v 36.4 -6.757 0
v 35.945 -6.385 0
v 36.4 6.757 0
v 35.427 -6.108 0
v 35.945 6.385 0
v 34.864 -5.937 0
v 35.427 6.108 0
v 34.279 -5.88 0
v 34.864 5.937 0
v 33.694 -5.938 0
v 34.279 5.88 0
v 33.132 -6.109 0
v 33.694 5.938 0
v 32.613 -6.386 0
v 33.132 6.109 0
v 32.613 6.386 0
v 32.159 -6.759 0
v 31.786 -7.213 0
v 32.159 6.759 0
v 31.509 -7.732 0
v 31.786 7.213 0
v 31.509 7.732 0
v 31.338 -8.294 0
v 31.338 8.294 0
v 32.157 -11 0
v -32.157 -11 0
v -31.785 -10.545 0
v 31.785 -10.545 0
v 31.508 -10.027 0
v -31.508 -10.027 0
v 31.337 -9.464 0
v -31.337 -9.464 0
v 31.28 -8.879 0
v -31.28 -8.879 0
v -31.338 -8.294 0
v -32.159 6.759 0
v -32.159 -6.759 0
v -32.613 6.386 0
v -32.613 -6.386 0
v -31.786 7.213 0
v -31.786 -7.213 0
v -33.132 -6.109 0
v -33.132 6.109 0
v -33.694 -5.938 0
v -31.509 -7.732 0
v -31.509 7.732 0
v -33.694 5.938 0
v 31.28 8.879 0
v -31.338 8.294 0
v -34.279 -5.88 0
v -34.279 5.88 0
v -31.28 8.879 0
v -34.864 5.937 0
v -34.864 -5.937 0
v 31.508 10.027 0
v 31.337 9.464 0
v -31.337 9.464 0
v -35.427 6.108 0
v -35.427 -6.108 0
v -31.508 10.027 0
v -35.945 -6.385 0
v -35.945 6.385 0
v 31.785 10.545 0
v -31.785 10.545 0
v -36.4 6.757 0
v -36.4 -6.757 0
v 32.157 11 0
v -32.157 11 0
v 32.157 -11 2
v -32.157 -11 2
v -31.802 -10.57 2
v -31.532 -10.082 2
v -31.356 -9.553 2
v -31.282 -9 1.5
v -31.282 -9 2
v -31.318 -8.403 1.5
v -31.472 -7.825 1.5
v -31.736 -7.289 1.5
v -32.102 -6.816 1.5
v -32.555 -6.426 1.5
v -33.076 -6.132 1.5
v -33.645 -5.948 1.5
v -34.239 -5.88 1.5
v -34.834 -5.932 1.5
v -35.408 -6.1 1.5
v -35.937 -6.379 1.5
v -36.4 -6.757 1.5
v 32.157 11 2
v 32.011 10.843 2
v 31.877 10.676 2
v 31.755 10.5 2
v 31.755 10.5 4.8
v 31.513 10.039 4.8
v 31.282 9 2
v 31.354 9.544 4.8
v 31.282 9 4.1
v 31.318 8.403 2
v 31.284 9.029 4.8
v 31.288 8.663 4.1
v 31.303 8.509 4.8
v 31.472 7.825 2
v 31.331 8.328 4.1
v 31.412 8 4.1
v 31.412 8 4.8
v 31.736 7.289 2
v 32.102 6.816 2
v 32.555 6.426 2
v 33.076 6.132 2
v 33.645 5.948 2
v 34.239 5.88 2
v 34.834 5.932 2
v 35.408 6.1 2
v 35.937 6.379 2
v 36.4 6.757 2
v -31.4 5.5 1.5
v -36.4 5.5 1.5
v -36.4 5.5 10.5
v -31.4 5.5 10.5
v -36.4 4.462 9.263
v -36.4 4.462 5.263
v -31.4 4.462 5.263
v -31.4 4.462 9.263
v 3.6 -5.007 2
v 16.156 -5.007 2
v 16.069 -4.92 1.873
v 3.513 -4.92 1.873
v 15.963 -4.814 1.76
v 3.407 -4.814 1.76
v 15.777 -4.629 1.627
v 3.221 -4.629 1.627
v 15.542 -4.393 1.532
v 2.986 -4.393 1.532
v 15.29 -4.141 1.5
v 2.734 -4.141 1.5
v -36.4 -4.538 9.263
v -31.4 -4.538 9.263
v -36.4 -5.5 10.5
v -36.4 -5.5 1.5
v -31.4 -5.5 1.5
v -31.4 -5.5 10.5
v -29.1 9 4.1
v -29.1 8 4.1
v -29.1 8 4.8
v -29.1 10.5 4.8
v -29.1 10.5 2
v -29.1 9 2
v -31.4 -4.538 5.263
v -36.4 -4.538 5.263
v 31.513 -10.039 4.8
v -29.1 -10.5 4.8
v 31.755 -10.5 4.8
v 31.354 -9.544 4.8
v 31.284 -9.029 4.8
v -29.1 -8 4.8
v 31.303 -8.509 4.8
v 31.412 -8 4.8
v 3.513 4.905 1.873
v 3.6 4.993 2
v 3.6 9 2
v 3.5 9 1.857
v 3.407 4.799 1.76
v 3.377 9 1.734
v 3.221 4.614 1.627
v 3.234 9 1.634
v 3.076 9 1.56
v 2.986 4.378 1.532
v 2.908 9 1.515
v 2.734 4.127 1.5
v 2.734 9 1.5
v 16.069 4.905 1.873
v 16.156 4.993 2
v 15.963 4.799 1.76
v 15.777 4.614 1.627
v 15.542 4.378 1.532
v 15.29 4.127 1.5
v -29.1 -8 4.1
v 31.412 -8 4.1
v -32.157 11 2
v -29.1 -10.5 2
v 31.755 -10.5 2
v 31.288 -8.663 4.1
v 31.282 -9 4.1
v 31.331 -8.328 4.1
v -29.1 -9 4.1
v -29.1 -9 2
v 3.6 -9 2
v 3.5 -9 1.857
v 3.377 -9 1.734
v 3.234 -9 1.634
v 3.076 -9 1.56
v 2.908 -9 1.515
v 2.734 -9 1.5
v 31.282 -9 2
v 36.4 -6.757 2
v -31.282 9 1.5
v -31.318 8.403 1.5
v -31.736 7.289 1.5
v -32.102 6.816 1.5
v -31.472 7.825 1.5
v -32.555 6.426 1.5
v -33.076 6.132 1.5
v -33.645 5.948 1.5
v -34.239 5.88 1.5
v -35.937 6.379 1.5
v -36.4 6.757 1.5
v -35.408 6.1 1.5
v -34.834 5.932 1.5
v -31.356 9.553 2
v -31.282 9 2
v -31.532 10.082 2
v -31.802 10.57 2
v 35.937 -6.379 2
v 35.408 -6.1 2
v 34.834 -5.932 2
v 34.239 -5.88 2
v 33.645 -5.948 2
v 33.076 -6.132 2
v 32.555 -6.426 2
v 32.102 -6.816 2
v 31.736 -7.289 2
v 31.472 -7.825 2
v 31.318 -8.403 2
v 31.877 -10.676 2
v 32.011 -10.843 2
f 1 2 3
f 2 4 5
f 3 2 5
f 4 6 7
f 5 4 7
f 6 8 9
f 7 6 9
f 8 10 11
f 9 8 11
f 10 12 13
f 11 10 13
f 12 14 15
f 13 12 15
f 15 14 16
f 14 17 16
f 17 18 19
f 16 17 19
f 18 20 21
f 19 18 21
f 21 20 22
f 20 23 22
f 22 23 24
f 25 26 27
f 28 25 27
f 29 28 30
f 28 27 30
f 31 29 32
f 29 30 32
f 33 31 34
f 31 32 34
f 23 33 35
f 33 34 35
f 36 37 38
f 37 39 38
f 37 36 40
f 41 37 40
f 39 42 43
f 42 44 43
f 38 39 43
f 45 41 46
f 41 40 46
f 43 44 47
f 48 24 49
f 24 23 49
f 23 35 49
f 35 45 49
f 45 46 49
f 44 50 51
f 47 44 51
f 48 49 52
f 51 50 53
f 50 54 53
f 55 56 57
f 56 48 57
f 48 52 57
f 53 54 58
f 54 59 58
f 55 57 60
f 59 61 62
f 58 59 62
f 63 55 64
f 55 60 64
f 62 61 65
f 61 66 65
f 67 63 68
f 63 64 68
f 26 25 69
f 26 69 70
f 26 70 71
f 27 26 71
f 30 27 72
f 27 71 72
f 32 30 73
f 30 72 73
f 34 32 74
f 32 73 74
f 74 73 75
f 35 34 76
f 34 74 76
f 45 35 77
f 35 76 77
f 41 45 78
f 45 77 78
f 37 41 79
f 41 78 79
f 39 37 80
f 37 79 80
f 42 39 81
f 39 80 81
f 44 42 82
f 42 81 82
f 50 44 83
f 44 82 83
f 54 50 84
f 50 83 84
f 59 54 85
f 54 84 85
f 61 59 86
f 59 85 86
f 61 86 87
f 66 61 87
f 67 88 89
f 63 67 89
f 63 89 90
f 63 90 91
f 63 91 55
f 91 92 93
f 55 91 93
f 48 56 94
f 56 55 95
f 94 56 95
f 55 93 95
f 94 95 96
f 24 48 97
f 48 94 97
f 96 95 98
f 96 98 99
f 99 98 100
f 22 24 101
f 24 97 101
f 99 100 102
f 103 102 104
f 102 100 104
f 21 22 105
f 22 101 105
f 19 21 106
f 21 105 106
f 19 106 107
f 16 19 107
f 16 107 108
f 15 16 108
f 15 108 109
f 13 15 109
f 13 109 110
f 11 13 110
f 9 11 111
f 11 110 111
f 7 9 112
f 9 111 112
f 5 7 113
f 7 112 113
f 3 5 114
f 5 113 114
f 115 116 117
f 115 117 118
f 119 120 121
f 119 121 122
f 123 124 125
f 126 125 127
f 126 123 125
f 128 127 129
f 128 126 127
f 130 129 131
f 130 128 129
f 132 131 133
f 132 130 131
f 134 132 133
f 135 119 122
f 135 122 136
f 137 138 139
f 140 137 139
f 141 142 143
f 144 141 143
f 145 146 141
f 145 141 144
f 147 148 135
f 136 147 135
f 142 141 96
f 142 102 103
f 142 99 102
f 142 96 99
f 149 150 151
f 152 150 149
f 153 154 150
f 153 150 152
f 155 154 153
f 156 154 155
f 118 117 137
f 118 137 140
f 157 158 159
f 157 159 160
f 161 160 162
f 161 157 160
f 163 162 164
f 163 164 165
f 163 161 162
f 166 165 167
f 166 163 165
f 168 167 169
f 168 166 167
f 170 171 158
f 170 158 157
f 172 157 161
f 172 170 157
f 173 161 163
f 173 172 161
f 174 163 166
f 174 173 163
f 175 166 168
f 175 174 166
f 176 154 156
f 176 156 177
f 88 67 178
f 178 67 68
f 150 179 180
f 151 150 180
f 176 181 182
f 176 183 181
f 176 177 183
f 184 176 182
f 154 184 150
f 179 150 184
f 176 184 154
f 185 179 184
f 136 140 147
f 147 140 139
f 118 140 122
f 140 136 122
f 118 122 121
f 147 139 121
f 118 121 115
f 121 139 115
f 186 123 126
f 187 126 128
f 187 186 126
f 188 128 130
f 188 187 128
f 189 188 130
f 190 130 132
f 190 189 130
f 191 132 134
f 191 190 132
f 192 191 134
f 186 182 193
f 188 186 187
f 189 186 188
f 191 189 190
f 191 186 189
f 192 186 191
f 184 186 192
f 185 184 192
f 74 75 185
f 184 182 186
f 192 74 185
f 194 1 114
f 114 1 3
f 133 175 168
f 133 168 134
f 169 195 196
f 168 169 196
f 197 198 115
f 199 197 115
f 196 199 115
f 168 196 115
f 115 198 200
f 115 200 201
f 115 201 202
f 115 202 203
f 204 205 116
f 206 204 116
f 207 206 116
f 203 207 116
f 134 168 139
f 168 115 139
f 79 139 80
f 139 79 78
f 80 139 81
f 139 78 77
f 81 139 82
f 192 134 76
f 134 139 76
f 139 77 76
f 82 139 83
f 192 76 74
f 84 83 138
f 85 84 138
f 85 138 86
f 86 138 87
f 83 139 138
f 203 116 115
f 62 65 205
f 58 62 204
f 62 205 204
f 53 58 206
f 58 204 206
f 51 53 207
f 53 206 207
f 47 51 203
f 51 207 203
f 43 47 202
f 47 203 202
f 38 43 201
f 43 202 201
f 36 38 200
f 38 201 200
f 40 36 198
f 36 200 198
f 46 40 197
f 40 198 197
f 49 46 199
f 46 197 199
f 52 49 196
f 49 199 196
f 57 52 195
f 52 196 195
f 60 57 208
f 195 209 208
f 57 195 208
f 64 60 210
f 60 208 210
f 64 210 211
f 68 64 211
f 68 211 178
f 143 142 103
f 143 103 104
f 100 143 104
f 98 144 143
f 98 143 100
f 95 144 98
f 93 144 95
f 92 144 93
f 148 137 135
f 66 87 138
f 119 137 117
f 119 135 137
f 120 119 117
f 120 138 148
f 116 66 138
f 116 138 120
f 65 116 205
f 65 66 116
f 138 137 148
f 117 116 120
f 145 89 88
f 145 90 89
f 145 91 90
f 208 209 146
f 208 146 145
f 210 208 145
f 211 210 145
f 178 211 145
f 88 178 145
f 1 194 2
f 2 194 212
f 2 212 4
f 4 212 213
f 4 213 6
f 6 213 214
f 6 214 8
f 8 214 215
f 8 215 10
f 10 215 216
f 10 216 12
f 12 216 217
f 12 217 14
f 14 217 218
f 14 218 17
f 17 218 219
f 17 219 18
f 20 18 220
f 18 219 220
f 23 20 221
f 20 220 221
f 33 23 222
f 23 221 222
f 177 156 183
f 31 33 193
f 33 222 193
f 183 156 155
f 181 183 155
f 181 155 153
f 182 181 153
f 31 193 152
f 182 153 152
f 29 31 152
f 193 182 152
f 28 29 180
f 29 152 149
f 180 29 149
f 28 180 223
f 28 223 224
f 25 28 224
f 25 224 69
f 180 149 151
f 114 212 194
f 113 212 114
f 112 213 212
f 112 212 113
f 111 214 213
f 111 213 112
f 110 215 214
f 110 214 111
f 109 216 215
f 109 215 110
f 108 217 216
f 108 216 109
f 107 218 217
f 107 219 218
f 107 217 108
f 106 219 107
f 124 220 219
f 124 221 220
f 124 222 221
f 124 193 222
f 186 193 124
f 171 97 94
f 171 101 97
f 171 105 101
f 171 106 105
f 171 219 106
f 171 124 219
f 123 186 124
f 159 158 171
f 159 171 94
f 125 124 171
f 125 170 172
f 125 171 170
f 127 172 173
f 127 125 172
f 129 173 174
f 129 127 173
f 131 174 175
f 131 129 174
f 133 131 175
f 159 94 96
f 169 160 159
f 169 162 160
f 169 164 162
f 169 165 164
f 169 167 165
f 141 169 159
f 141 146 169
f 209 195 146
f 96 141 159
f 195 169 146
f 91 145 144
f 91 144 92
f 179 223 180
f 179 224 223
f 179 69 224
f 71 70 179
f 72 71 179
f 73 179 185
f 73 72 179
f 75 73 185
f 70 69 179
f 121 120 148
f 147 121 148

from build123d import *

# Parameters (mm, degrees)
SKIZZE1_W                       = 22
SKIZZE1_H                       = 72.8
AUFSATZ_LINEAR_AUSTRAGEN1_DEPTH = 2
SKIZZE2_R                       = 3
SCHNITT_LINEAR_AUSTRAGEN1_DEPTH = 2
SKIZZE3_W                       = 65.5
SKIZZE3_H                       = 21
AUFSATZ_LINEAR_AUSTRAGEN2_DEPTH = 2.8
SCHNITT_LINEAR_AUSTRAGEN2_DEPTH = 67.590464783
SKIZZE5_R                       = 3
SCHNITT_LINEAR_AUSTRAGEN4_DEPTH = 39.128729326
SKIZZE6_W                       = 18
SKIZZE6_H                       = 1
SCHNITT_LINEAR_AUSTRAGEN5_DEPTH = 40
SKIZZE8_W                       = 15
SKIZZE8_H                       = 10
SCHNITT_LINEAR_AUSTRAGEN6_DEPTH = 0.5
VERRUNDUNG3_R                   = 1
SKIZZE9_W                       = 5
SKIZZE9_H                       = 11
AUFSATZ_LINEAR_AUSTRAGEN3_DEPTH = 9
SKIZZE10_W                      = 9
SKIZZE10_H                      = 4
SCHNITT_LINEAR_AUSTRAGEN7_DEPTH = 75.371298227


with BuildPart() as part:
    # Skizze1 → Aufsatz-Linear austragen1 (new body)
    with BuildSketch(Plane(origin=(0, 0, 0), x_dir=(0, 1, 0), z_dir=(0, 0, 1))):
        Rectangle(SKIZZE1_W, SKIZZE1_H)
    extrude(amount=AUFSATZ_LINEAR_AUSTRAGEN1_DEPTH)

    # Skizze2 → Schnitt-Linear austragen1 (cut)
    with BuildSketch(Plane.XY.offset(2)):
        with Locations((-34.28, 8.88)):
            Circle(SKIZZE2_R)
        with Locations((-34.28, -8.88)):
            Circle(SKIZZE2_R)
        with Locations((34.28, -8.88)):
            Circle(SKIZZE2_R)
        with Locations((34.28, 8.88)):
            Circle(SKIZZE2_R)
    extrude(amount=-SCHNITT_LINEAR_AUSTRAGEN1_DEPTH, mode=Mode.SUBTRACT)

    # Skizze3 → Aufsatz-Linear austragen2 (add)
    with BuildSketch(Plane.XY.offset(2)):
        with Locations((3.65, 0)):
            Rectangle(SKIZZE3_W, SKIZZE3_H)
    extrude(amount=AUFSATZ_LINEAR_AUSTRAGEN2_DEPTH)

    # Skizze4 → Schnitt-Linear austragen2 (cut, through all)
    with BuildSketch(Plane(origin=(-29.1, 0, 0), x_dir=(0, -1, 0), z_dir=(-1, 0, 0))):
        Polygon((-8, 4.8), (8, 4.8), (8, 4.1), (9, 4.1), (9, 2), (-9, 2), (-9, 4.1), (-8, 4.1), align=None)
    extrude(amount=-SCHNITT_LINEAR_AUSTRAGEN2_DEPTH, mode=Mode.SUBTRACT)

    # Skizze5 → Schnitt-Linear austragen4 (cut, through all)
    with BuildSketch(Plane(origin=(0, 0, 2), x_dir=(1, 0, 0), z_dir=(0, 0, -1))):
        with Locations((34.28, -8.88)):
            Circle(SKIZZE5_R)
        with Locations((34.28, 8.88)):
            Circle(SKIZZE5_R)
    extrude(amount=-SCHNITT_LINEAR_AUSTRAGEN4_DEPTH, mode=Mode.SUBTRACT)

    # Skizze6 → Schnitt-Linear austragen5 (cut)
    with BuildSketch(Plane(origin=(-36.4, 0, 0), x_dir=(0, -1, 0), z_dir=(-1, 0, 0))):
        with Locations((0, 2)):
            Rectangle(SKIZZE6_W, SKIZZE6_H)
    extrude(amount=-SCHNITT_LINEAR_AUSTRAGEN5_DEPTH, mode=Mode.SUBTRACT)

    # Skizze8 → Schnitt-Linear austragen6 (cut)
    with BuildSketch(Plane.XY.offset(2)):
        with Locations((8.655984658, -0.007335612)):
            Rectangle(SKIZZE8_W, SKIZZE8_H)
    extrude(amount=-SCHNITT_LINEAR_AUSTRAGEN6_DEPTH, mode=Mode.SUBTRACT)

    # Verrundung3
    # the kernel refuses this fillet: 1 mm, written as the material it adds along each edge
    with BuildSketch(Plane(origin=(3.6, -9, 1.5), x_dir=(0, 0, 1), z_dir=(0, 1, 0))) as verrundung3_piece_1:
        with BuildLine():
            CenterArc((1, -0.866025404), VERRUNDUNG3_R, 120, 60)
            Line((0, -0.866025404), (-0.02, -0.866025404))
            Line((-0.02, -0.866025404), (-0.02, 0))
            Line((-0.02, 0), (0, 0.02))
            ThreePointArc((0, 0.02), (0.25, 0.02), (0.49, 0.017320508))
            Line((0.49, 0.017320508), (0.5, 0))
        make_face()
    extrude(amount=3.992664388)
    with BuildSketch(Plane(origin=(3.6, -5.007335612, 1.5), x_dir=(0, 0, 1), z_dir=(1, 0, 0)), Plane(origin=(16.155984658, 4.992664388, 1.5), x_dir=(0, 0, 1), z_dir=(-1, 0, 0))) as verrundung3_piece_2:
        with BuildLine():
            CenterArc((1, -0.866025404), VERRUNDUNG3_R, 120, 60)
            Line((0, -0.866025404), (-0.02, -0.866025404))
            Line((-0.02, -0.866025404), (-0.02, 0))
            Line((-0.02, 0), (0, 0.02))
            ThreePointArc((0, 0.02), (0.25, 0.02), (0.49, 0.017320508))
            Line((0.49, 0.017320508), (0.5, 0))
        make_face()
    extrude(amount=12.555984658)
    with BuildSketch(Plane(origin=(3.6, 4.992664388, 1.5), x_dir=(0, 0, 1), z_dir=(0, 1, 0))) as verrundung3_piece_3:
        with BuildLine():
            CenterArc((1, -0.866025404), VERRUNDUNG3_R, 120, 60)
            Line((0, -0.866025404), (-0.02, -0.866025404))
            Line((-0.02, -0.866025404), (-0.02, 0))
            Line((-0.02, 0), (0, 0.02))
            ThreePointArc((0, 0.02), (0.25, 0.02), (0.49, 0.017320508))
            Line((0.49, 0.017320508), (0.5, 0))
        make_face()
    extrude(amount=4.007335612)
    with BuildSketch(Plane(origin=(16.155984658, -5.007335612, 1.5), x_dir=(0, 0, 1), z_dir=(0, 1, 0))) as verrundung3_piece_4:
        with BuildLine():
            CenterArc((1, -0.866025404), VERRUNDUNG3_R, 120, 60)
            Line((0, -0.866025404), (-0.02, -0.866025404))
            Line((-0.02, -0.866025404), (-0.02, 0))
            Line((-0.02, 0), (0, 0.02))
            ThreePointArc((0, 0.02), (0.25, 0.02), (0.49, 0.017320508))
            Line((0.49, 0.017320508), (0.5, 0))
        make_face()
    extrude(amount=10)
    with BuildSketch(Plane(origin=(3.6, -9, 1.5), x_dir=(0, 0, 1), z_dir=(0, 1, 0))) as verrundung3_piece_5a_section:
        with BuildLine():
            CenterArc((1, -0.866025404), VERRUNDUNG3_R, 120, 60)
            Line((0, -0.866025404), (-0.02, -0.866025404))
            Line((-0.02, -0.866025404), (-0.02, 0))
            Line((-0.02, 0), (0, 0.02))
            ThreePointArc((0, 0.02), (0.25, 0.02), (0.49, 0.017320508))
            Line((0.49, 0.017320508), (0.5, 0))
        make_face()
    verrundung3_piece_5a = extrude(amount=6.157727897, mode=Mode.PRIVATE)
    verrundung3_piece_5a = split(verrundung3_piece_5a, bisect_by=Plane(origin=(3.383689554, -5.007335612, 1.629516711), z_dir=(0, 1, 0)), keep=Keep.TOP, mode=Mode.PRIVATE)
    with BuildSketch(Plane(origin=(1.434936491, -5.007335612, 1.5), x_dir=(0, 0, 1), z_dir=(1, 0, 0))) as verrundung3_piece_5b_section:
        with BuildLine():
            CenterArc((1, -0.866025404), VERRUNDUNG3_R, 120, 60)
            Line((0, -0.866025404), (-0.02, -0.866025404))
            Line((-0.02, -0.866025404), (-0.02, 0))
            Line((-0.02, 0), (0, 0.02))
            ThreePointArc((0, 0.02), (0.25, 0.02), (0.49, 0.017320508))
            Line((0.49, 0.017320508), (0.5, 0))
        make_face()
    verrundung3_piece_5b = extrude(amount=14.721048168, mode=Mode.PRIVATE)
    verrundung3_piece_5b = split(verrundung3_piece_5b, bisect_by=Plane(origin=(3.6, -4.791025166, 1.629516711), z_dir=(-1, 0, 0)), keep=Keep.TOP, mode=Mode.PRIVATE)
    verrundung3_piece_5 = verrundung3_piece_5a & verrundung3_piece_5b
    add(verrundung3_piece_5)
    with BuildSketch(Plane(origin=(3.6, -5.007335612, 1.5), x_dir=(0, 0, 1), z_dir=(1, 0, 0))) as verrundung3_piece_6a_section:
        with BuildLine():
            CenterArc((1, -0.866025404), VERRUNDUNG3_R, 120, 60)
            Line((0, -0.866025404), (-0.02, -0.866025404))
            Line((-0.02, -0.866025404), (-0.02, 0))
            Line((-0.02, 0), (0, 0.02))
            ThreePointArc((0, 0.02), (0.25, 0.02), (0.49, 0.017320508))
            Line((0.49, 0.017320508), (0.5, 0))
        make_face()
    verrundung3_piece_6a = extrude(amount=14.721048168, mode=Mode.PRIVATE)
    verrundung3_piece_6a = split(verrundung3_piece_6a, bisect_by=Plane(origin=(16.155984658, -4.791025166, 1.629516711), z_dir=(1, 0, 0)), keep=Keep.TOP, mode=Mode.PRIVATE)
    with BuildSketch(Plane(origin=(16.155984658, -7.172399122, 1.5), x_dir=(0, 0, 1), z_dir=(0, 1, 0))) as verrundung3_piece_6b_section:
        with BuildLine():
            CenterArc((1, -0.866025404), VERRUNDUNG3_R, 120, 60)
            Line((0, -0.866025404), (-0.02, -0.866025404))
            Line((-0.02, -0.866025404), (-0.02, 0))
            Line((-0.02, 0), (0, 0.02))
            ThreePointArc((0, 0.02), (0.25, 0.02), (0.49, 0.017320508))
            Line((0.49, 0.017320508), (0.5, 0))
        make_face()
    verrundung3_piece_6b = extrude(amount=12.165063509, mode=Mode.PRIVATE)
    verrundung3_piece_6b = split(verrundung3_piece_6b, bisect_by=Plane(origin=(15.939674213, -5.007335612, 1.629516711), z_dir=(0, -1, 0)), keep=Keep.TOP, mode=Mode.PRIVATE)
    verrundung3_piece_6 = verrundung3_piece_6a & verrundung3_piece_6b
    add(verrundung3_piece_6)
    with BuildSketch(Plane(origin=(16.155984658, 4.992664388, 1.5), x_dir=(0, 0, 1), z_dir=(-1, 0, 0))) as verrundung3_piece_7a_section:
        with BuildLine():
            CenterArc((1, -0.866025404), VERRUNDUNG3_R, 120, 60)
            Line((0, -0.866025404), (-0.02, -0.866025404))
            Line((-0.02, -0.866025404), (-0.02, 0))
            Line((-0.02, 0), (0, 0.02))
            ThreePointArc((0, 0.02), (0.25, 0.02), (0.49, 0.017320508))
            Line((0.49, 0.017320508), (0.5, 0))
        make_face()
    verrundung3_piece_7a = extrude(amount=14.721048168, mode=Mode.PRIVATE)
    verrundung3_piece_7a = split(verrundung3_piece_7a, bisect_by=Plane(origin=(3.6, 4.776353942, 1.629516711), z_dir=(-1, 0, 0)), keep=Keep.TOP, mode=Mode.PRIVATE)
    with BuildSketch(Plane(origin=(3.6, 2.827600878, 1.5), x_dir=(0, 0, 1), z_dir=(0, 1, 0))) as verrundung3_piece_7b_section:
        with BuildLine():
            CenterArc((1, -0.866025404), VERRUNDUNG3_R, 120, 60)
            Line((0, -0.866025404), (-0.02, -0.866025404))
            Line((-0.02, -0.866025404), (-0.02, 0))
            Line((-0.02, 0), (0, 0.02))
            ThreePointArc((0, 0.02), (0.25, 0.02), (0.49, 0.017320508))
            Line((0.49, 0.017320508), (0.5, 0))
        make_face()
    verrundung3_piece_7b = extrude(amount=6.172399122, mode=Mode.PRIVATE)
    verrundung3_piece_7b = split(verrundung3_piece_7b, bisect_by=Plane(origin=(3.383689554, 4.992664388, 1.629516711), z_dir=(0, -1, 0)), keep=Keep.TOP, mode=Mode.PRIVATE)
    verrundung3_piece_7 = verrundung3_piece_7a & verrundung3_piece_7b
    add(verrundung3_piece_7)
    with BuildSketch(Plane(origin=(16.155984658, -5.007335612, 1.5), x_dir=(0, 0, 1), z_dir=(0, 1, 0))) as verrundung3_piece_8a_section:
        with BuildLine():
            CenterArc((1, -0.866025404), VERRUNDUNG3_R, 120, 60)
            Line((0, -0.866025404), (-0.02, -0.866025404))
            Line((-0.02, -0.866025404), (-0.02, 0))
            Line((-0.02, 0), (0, 0.02))
            ThreePointArc((0, 0.02), (0.25, 0.02), (0.49, 0.017320508))
            Line((0.49, 0.017320508), (0.5, 0))
        make_face()
    verrundung3_piece_8a = extrude(amount=12.165063509, mode=Mode.PRIVATE)
    verrundung3_piece_8a = split(verrundung3_piece_8a, bisect_by=Plane(origin=(15.939674213, 4.992664388, 1.629516711), z_dir=(0, 1, 0)), keep=Keep.TOP, mode=Mode.PRIVATE)
    with BuildSketch(Plane(origin=(18.321048168, 4.992664388, 1.5), x_dir=(0, 0, 1), z_dir=(-1, 0, 0))) as verrundung3_piece_8b_section:
        with BuildLine():
            CenterArc((1, -0.866025404), VERRUNDUNG3_R, 120, 60)
            Line((0, -0.866025404), (-0.02, -0.866025404))
            Line((-0.02, -0.866025404), (-0.02, 0))
            Line((-0.02, 0), (0, 0.02))
            ThreePointArc((0, 0.02), (0.25, 0.02), (0.49, 0.017320508))
            Line((0.49, 0.017320508), (0.5, 0))
        make_face()
    verrundung3_piece_8b = extrude(amount=14.721048168, mode=Mode.PRIVATE)
    verrundung3_piece_8b = split(verrundung3_piece_8b, bisect_by=Plane(origin=(16.155984658, 4.776353942, 1.629516711), z_dir=(1, 0, 0)), keep=Keep.TOP, mode=Mode.PRIVATE)
    verrundung3_piece_8 = verrundung3_piece_8a & verrundung3_piece_8b
    add(verrundung3_piece_8)

    # Skizze9 → Aufsatz-Linear austragen3 (add)
    with BuildSketch(Plane.XY.offset(1.5)):
        with Locations((-33.9, 0)):
            Rectangle(SKIZZE9_W, SKIZZE9_H)
    extrude(amount=AUFSATZ_LINEAR_AUSTRAGEN3_DEPTH)

    # Skizze10 → Schnitt-Linear austragen7 (cut, through all)
    with BuildSketch(Plane(origin=(-36.4, 0, 0), x_dir=(0, -1, 0), z_dir=(-1, 0, 0))):
        with Locations((0.038201858, 7.263431172)):
            Rectangle(SKIZZE10_W, SKIZZE10_H)
    extrude(amount=-SCHNITT_LINEAR_AUSTRAGEN7_DEPTH, mode=Mode.SUBTRACT)


solid = part.part
